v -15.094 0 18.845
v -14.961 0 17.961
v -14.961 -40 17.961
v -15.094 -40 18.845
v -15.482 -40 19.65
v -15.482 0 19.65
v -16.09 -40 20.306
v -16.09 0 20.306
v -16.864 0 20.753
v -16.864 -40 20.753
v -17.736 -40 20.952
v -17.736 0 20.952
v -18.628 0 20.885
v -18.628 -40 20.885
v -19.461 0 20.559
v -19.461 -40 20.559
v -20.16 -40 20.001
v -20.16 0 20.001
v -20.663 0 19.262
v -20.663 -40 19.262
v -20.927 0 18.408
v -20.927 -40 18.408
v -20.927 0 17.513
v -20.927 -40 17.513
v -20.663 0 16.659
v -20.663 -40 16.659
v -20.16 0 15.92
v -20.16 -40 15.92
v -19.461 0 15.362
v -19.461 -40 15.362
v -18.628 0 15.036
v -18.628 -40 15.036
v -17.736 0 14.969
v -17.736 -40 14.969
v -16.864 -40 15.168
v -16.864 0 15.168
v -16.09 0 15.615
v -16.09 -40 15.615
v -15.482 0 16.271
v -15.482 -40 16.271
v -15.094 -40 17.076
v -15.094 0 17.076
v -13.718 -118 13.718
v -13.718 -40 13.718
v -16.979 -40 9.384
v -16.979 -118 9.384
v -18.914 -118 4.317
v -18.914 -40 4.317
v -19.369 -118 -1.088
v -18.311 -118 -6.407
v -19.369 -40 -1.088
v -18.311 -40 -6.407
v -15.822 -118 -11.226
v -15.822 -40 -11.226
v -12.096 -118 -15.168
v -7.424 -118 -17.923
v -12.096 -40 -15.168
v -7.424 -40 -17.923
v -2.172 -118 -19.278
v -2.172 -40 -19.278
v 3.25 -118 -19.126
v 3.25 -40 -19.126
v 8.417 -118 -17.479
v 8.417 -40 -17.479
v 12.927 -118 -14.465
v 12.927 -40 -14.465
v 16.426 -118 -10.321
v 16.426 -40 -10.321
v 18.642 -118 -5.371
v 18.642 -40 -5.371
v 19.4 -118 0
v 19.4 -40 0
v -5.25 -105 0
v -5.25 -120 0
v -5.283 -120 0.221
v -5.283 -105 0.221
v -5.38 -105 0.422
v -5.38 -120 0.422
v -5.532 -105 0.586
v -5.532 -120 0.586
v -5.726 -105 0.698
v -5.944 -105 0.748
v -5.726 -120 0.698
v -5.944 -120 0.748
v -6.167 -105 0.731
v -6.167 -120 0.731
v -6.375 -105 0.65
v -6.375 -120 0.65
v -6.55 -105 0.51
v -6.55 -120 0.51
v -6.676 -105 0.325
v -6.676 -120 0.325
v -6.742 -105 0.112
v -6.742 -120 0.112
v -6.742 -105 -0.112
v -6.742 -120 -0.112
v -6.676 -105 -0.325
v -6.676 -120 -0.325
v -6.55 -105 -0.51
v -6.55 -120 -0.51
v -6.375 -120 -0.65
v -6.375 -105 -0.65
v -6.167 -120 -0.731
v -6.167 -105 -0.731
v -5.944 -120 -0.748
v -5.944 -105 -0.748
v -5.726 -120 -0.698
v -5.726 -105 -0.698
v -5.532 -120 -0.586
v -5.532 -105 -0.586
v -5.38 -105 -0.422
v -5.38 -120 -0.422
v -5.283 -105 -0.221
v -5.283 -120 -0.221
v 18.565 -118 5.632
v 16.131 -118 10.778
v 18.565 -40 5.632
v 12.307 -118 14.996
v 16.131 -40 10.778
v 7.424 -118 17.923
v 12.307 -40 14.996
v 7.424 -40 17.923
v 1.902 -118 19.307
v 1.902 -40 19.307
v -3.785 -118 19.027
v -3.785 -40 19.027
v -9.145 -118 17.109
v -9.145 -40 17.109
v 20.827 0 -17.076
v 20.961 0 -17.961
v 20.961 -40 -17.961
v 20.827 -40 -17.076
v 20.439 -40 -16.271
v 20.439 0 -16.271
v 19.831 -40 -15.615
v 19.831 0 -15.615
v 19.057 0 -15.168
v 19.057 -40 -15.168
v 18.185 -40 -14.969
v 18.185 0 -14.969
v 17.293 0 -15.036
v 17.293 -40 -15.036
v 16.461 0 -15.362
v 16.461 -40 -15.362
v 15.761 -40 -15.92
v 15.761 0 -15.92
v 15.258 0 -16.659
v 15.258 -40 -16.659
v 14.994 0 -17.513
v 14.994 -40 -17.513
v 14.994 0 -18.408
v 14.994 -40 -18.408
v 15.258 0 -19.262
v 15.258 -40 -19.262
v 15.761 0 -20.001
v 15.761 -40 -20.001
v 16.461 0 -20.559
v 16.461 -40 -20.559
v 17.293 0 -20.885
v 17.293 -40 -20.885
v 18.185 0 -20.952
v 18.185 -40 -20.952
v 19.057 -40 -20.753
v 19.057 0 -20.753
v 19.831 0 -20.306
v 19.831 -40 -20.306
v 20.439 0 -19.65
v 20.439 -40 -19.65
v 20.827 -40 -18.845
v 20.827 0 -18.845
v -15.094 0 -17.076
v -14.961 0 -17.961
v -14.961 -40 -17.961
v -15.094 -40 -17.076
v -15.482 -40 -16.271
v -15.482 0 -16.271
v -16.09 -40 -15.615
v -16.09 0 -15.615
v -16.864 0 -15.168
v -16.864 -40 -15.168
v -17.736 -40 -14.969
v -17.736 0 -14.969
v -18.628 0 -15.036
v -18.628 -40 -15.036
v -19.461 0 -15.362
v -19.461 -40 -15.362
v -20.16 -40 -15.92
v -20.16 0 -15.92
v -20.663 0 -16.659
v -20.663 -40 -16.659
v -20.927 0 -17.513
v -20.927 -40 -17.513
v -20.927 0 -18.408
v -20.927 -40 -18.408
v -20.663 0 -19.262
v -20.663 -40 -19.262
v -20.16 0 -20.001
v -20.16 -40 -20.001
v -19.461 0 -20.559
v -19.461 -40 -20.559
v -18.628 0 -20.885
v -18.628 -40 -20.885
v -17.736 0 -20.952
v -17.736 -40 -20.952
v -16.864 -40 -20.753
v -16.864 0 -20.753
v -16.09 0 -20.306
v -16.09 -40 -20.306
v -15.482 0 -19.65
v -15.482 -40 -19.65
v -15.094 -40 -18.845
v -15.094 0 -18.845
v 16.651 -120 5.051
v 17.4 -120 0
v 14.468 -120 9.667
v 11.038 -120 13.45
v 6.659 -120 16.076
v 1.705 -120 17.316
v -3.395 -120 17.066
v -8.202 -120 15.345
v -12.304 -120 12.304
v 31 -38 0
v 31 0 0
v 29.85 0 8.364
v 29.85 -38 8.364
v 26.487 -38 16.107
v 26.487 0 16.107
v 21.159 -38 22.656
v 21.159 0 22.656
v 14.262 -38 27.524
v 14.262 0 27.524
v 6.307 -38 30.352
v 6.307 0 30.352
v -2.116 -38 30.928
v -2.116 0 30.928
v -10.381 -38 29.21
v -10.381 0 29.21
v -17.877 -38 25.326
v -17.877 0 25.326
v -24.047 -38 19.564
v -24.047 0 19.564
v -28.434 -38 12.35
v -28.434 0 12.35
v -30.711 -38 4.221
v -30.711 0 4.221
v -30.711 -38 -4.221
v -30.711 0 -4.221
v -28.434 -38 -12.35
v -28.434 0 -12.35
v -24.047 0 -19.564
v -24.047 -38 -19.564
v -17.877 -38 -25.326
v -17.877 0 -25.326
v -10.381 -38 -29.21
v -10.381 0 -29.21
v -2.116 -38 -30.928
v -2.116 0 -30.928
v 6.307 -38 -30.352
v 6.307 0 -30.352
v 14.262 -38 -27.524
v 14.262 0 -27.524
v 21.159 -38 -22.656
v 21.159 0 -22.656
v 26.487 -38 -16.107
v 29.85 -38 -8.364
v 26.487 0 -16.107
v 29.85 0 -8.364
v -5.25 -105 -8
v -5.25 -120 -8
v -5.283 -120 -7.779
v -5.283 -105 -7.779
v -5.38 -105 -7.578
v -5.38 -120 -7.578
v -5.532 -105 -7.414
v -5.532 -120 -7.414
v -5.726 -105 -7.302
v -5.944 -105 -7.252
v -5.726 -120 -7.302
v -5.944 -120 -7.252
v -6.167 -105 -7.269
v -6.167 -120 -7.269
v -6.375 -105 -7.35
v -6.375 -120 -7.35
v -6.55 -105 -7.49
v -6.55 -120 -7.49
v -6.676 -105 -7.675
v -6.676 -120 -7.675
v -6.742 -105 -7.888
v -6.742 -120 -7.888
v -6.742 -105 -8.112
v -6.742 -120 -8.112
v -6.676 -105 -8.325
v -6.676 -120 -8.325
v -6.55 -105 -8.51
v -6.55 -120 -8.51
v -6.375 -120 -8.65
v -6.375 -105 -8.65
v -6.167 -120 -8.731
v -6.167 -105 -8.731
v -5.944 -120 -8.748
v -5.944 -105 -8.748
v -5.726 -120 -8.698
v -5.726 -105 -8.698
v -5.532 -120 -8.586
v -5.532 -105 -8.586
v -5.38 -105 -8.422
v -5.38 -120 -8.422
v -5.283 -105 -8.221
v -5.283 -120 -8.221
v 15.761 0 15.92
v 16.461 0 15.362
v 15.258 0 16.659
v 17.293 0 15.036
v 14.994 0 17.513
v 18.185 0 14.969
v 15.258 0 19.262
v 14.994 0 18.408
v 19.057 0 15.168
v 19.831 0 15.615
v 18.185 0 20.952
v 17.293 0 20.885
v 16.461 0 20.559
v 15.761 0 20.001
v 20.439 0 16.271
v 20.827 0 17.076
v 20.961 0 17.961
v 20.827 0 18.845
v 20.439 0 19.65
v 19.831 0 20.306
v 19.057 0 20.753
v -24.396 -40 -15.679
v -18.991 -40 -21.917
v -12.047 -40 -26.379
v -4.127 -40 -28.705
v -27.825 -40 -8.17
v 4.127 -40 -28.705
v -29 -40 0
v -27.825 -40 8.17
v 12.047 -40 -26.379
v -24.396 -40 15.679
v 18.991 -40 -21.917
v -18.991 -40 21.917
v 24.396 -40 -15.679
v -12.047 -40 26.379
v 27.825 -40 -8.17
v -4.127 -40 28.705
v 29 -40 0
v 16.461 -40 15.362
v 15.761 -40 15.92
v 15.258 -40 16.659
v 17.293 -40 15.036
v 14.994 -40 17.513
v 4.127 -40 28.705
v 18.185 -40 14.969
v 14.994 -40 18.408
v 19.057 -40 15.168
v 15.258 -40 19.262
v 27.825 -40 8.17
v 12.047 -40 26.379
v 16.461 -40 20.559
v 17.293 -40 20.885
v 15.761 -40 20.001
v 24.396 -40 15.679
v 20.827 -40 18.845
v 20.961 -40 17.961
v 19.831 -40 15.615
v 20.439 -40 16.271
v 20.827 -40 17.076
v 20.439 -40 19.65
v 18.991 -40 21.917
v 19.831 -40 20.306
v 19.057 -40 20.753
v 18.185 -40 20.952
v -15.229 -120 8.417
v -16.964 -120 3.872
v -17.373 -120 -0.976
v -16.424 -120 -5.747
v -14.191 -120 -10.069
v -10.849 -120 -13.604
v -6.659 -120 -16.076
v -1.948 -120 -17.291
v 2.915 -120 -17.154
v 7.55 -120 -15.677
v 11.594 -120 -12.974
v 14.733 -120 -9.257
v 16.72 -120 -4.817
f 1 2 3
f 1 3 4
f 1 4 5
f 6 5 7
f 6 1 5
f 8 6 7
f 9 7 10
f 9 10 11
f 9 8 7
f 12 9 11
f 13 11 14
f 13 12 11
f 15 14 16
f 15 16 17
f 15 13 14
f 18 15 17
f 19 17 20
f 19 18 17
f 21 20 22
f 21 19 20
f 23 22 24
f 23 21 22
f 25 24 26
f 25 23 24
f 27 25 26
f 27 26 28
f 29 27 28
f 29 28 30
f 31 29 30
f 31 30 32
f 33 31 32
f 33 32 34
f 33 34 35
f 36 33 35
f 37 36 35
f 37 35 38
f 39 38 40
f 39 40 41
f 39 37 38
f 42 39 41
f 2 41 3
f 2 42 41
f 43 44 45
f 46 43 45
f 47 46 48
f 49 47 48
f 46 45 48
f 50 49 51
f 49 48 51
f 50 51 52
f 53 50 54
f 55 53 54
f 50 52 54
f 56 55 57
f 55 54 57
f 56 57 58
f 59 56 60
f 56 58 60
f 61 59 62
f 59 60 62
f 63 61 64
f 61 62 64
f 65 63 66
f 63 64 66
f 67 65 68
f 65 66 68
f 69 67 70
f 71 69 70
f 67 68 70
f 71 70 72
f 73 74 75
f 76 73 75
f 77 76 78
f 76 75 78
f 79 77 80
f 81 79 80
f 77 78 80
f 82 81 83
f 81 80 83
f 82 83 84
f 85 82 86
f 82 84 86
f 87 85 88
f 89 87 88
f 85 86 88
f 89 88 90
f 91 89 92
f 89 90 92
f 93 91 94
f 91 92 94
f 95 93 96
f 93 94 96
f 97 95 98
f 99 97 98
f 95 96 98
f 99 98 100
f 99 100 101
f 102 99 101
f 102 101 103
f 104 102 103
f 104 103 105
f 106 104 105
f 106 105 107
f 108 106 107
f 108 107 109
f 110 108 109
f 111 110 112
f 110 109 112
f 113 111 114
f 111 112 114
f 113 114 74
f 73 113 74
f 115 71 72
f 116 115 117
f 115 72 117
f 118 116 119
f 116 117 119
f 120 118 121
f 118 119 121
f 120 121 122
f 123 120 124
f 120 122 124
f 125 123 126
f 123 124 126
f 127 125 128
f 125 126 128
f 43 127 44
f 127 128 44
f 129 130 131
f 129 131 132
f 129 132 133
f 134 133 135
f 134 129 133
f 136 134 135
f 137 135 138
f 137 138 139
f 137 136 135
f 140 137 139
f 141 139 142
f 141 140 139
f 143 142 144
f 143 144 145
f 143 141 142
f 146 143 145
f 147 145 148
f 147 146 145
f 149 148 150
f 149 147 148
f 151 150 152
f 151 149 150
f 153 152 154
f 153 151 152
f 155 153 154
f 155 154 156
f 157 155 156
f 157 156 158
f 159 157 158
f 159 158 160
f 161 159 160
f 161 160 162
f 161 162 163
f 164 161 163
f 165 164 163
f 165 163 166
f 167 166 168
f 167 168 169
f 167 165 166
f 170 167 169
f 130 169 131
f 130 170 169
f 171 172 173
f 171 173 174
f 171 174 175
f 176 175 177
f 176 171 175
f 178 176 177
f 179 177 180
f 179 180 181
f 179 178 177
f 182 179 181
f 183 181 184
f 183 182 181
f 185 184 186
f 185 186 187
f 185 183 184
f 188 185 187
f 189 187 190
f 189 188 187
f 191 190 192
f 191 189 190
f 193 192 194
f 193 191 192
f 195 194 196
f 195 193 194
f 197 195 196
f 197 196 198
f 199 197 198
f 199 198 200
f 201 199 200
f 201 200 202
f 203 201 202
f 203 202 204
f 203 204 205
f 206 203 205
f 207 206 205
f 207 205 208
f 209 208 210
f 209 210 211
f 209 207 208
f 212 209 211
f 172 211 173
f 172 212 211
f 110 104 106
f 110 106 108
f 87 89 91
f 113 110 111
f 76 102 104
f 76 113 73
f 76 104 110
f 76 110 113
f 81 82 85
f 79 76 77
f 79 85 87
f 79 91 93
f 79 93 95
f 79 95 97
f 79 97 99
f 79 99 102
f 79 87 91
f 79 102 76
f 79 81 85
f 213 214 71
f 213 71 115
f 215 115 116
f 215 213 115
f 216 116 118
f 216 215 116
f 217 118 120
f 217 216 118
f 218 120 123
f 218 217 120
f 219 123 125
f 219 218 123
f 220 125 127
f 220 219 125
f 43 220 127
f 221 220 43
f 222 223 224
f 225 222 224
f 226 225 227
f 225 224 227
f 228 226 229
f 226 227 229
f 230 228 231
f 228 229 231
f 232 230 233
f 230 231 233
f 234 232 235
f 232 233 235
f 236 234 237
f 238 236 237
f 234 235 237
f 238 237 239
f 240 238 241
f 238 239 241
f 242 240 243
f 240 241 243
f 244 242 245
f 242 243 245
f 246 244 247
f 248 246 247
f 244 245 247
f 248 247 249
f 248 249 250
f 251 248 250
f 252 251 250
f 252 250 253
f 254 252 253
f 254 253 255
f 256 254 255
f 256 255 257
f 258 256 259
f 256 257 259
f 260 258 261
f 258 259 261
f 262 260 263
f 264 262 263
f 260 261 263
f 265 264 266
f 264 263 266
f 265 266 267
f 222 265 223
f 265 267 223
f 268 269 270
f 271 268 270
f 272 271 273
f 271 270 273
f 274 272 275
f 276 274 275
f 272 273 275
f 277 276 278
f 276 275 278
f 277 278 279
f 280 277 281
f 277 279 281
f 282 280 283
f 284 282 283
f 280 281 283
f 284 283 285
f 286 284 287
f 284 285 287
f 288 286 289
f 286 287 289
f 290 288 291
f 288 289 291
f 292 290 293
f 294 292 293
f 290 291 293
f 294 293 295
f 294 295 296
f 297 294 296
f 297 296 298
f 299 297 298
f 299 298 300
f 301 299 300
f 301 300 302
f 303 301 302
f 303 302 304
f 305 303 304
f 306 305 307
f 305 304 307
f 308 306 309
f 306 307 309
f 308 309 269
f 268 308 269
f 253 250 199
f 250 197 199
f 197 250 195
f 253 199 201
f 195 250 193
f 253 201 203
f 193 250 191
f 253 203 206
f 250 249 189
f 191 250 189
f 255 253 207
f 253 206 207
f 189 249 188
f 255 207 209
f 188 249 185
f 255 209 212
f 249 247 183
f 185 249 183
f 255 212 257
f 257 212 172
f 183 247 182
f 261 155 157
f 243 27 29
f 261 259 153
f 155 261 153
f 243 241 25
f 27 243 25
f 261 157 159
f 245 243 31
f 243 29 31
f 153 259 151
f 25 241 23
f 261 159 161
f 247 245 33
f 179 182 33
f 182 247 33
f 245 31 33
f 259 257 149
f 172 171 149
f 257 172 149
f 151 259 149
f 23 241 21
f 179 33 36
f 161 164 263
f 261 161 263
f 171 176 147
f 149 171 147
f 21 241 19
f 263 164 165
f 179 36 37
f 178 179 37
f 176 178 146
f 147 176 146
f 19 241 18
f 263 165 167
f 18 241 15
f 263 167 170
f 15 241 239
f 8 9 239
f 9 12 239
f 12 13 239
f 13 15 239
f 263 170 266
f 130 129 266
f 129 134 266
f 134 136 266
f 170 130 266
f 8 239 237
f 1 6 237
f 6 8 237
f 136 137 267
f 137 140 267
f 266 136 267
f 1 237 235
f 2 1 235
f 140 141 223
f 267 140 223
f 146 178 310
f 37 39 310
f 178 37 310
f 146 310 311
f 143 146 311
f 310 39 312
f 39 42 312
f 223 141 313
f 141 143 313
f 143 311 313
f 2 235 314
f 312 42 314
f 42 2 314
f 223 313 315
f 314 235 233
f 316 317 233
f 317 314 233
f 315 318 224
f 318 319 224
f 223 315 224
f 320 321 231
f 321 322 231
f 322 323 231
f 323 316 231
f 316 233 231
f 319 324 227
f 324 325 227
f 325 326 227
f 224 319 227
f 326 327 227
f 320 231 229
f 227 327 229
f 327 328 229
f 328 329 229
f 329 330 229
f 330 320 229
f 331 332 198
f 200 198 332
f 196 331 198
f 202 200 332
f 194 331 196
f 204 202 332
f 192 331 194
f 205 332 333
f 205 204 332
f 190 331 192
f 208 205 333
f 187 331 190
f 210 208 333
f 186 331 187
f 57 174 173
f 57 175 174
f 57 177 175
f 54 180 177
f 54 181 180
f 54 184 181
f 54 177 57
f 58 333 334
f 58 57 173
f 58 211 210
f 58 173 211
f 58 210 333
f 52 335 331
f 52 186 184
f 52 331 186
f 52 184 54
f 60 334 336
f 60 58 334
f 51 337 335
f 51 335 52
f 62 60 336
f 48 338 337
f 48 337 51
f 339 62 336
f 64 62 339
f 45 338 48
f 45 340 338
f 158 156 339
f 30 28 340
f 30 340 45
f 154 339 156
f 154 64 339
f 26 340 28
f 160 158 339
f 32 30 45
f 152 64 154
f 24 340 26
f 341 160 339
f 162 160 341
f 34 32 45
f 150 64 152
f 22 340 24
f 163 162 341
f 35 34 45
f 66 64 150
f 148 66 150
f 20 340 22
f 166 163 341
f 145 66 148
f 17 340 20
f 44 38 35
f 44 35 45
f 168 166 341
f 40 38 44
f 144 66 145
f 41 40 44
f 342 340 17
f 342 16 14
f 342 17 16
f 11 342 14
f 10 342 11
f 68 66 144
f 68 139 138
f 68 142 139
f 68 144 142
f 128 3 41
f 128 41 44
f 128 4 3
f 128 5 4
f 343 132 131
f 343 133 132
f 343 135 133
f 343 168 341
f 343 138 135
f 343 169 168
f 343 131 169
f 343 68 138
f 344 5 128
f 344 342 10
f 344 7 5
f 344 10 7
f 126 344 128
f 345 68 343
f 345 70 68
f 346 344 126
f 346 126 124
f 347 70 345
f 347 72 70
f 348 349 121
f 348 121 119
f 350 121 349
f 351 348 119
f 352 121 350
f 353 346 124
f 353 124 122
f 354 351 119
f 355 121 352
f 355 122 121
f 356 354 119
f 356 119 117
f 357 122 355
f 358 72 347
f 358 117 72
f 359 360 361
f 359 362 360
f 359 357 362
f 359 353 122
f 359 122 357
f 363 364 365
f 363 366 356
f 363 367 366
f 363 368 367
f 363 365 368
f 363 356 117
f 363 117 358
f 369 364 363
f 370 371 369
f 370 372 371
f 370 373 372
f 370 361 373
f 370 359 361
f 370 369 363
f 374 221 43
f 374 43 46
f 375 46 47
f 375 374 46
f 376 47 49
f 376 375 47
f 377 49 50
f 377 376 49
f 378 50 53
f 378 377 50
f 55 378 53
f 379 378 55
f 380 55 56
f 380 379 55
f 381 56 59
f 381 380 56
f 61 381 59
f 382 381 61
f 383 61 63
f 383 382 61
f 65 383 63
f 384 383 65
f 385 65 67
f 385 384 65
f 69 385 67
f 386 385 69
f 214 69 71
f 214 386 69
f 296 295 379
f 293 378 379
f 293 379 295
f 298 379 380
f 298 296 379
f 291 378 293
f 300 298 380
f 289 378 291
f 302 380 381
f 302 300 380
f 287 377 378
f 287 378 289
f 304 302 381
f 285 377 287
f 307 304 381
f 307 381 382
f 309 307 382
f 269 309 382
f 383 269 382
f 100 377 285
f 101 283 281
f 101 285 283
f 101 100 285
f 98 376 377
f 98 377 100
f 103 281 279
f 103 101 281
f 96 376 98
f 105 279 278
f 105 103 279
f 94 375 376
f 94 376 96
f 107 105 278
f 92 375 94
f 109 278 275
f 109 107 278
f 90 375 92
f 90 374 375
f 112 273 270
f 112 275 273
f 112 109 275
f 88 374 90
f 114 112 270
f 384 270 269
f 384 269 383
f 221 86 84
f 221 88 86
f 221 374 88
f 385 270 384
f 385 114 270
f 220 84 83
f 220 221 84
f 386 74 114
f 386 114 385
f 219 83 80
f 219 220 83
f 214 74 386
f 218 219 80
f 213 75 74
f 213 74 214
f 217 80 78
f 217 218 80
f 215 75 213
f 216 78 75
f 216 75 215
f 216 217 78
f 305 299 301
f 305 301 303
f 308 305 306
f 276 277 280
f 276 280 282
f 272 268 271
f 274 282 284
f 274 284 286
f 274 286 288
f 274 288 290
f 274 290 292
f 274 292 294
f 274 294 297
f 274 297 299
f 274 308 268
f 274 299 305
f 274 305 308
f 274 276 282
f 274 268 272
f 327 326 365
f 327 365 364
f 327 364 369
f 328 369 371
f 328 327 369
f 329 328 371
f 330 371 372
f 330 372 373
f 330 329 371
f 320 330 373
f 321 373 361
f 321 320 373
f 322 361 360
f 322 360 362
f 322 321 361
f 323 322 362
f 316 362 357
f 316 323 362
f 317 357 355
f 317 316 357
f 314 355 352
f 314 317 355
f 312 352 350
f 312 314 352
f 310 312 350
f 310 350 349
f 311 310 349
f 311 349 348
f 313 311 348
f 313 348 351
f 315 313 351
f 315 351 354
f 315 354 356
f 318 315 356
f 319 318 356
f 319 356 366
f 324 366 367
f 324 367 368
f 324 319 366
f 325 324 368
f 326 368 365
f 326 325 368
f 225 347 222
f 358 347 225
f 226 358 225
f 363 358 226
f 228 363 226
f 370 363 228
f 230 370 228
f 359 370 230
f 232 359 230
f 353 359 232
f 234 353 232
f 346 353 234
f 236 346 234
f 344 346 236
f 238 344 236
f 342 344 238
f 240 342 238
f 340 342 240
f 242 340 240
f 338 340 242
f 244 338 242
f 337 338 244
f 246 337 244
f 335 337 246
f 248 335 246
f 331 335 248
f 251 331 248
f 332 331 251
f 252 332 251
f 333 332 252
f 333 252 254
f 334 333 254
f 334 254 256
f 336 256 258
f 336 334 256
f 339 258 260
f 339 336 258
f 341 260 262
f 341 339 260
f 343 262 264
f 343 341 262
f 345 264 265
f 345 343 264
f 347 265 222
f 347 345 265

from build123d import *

# Parameters (mm, degrees)
F0_R     = 31
F0_R_2   = 3
F1_DEPTH = 40
F3_DEPTH = 80
F4_R     = 0.75
F5_DEPTH = 15
F6_SIZE  = 2


with BuildPart() as f1:
    # F0 (on Front) → F1 (new body)
    with BuildSketch(Plane.XZ):
        Circle(F0_R)
        with Locations((-17.960512, -17.960512)):
            Circle(F0_R_2, mode=Mode.SUBTRACT)
        with Locations((17.960512, -17.960512)):
            Circle(F0_R_2, mode=Mode.SUBTRACT)
        with Locations((-17.960512, 17.960512)):
            Circle(F0_R_2, mode=Mode.SUBTRACT)
        with Locations((17.960512, 17.960512)):
            Circle(F0_R_2, mode=Mode.SUBTRACT)
    extrude(amount=F1_DEPTH)

    # F2 (on face) → F3 (join)
    with BuildSketch(Plane.XZ.offset(40)):
        with BuildLine():
            ThreePointArc((19.4, 0), (7.424059, 17.923263), (-13.717872, 13.717872))
            ThreePointArc((-13.717872, 13.717872), (-7.424059, -17.923263), (19.4, 0))
        make_face()
    extrude(amount=F3_DEPTH)

    # F4 (on face) → F5 (cut)
    with BuildSketch(Plane.XZ.offset(120)):
        with Locations((-6, 0)):
            Circle(F4_R)
        with Locations((-6, -8)):
            Circle(F4_R)
    extrude(amount=-F5_DEPTH, mode=Mode.SUBTRACT)

    # F6
    f6_edges = [f1.edges().sort_by_distance(p)[0] for p in [
        (-19.4, -120, 0),
        (-31, -40, 0),
    ]]
    chamfer(f6_edges, length=F6_SIZE)


solid = f1.part
